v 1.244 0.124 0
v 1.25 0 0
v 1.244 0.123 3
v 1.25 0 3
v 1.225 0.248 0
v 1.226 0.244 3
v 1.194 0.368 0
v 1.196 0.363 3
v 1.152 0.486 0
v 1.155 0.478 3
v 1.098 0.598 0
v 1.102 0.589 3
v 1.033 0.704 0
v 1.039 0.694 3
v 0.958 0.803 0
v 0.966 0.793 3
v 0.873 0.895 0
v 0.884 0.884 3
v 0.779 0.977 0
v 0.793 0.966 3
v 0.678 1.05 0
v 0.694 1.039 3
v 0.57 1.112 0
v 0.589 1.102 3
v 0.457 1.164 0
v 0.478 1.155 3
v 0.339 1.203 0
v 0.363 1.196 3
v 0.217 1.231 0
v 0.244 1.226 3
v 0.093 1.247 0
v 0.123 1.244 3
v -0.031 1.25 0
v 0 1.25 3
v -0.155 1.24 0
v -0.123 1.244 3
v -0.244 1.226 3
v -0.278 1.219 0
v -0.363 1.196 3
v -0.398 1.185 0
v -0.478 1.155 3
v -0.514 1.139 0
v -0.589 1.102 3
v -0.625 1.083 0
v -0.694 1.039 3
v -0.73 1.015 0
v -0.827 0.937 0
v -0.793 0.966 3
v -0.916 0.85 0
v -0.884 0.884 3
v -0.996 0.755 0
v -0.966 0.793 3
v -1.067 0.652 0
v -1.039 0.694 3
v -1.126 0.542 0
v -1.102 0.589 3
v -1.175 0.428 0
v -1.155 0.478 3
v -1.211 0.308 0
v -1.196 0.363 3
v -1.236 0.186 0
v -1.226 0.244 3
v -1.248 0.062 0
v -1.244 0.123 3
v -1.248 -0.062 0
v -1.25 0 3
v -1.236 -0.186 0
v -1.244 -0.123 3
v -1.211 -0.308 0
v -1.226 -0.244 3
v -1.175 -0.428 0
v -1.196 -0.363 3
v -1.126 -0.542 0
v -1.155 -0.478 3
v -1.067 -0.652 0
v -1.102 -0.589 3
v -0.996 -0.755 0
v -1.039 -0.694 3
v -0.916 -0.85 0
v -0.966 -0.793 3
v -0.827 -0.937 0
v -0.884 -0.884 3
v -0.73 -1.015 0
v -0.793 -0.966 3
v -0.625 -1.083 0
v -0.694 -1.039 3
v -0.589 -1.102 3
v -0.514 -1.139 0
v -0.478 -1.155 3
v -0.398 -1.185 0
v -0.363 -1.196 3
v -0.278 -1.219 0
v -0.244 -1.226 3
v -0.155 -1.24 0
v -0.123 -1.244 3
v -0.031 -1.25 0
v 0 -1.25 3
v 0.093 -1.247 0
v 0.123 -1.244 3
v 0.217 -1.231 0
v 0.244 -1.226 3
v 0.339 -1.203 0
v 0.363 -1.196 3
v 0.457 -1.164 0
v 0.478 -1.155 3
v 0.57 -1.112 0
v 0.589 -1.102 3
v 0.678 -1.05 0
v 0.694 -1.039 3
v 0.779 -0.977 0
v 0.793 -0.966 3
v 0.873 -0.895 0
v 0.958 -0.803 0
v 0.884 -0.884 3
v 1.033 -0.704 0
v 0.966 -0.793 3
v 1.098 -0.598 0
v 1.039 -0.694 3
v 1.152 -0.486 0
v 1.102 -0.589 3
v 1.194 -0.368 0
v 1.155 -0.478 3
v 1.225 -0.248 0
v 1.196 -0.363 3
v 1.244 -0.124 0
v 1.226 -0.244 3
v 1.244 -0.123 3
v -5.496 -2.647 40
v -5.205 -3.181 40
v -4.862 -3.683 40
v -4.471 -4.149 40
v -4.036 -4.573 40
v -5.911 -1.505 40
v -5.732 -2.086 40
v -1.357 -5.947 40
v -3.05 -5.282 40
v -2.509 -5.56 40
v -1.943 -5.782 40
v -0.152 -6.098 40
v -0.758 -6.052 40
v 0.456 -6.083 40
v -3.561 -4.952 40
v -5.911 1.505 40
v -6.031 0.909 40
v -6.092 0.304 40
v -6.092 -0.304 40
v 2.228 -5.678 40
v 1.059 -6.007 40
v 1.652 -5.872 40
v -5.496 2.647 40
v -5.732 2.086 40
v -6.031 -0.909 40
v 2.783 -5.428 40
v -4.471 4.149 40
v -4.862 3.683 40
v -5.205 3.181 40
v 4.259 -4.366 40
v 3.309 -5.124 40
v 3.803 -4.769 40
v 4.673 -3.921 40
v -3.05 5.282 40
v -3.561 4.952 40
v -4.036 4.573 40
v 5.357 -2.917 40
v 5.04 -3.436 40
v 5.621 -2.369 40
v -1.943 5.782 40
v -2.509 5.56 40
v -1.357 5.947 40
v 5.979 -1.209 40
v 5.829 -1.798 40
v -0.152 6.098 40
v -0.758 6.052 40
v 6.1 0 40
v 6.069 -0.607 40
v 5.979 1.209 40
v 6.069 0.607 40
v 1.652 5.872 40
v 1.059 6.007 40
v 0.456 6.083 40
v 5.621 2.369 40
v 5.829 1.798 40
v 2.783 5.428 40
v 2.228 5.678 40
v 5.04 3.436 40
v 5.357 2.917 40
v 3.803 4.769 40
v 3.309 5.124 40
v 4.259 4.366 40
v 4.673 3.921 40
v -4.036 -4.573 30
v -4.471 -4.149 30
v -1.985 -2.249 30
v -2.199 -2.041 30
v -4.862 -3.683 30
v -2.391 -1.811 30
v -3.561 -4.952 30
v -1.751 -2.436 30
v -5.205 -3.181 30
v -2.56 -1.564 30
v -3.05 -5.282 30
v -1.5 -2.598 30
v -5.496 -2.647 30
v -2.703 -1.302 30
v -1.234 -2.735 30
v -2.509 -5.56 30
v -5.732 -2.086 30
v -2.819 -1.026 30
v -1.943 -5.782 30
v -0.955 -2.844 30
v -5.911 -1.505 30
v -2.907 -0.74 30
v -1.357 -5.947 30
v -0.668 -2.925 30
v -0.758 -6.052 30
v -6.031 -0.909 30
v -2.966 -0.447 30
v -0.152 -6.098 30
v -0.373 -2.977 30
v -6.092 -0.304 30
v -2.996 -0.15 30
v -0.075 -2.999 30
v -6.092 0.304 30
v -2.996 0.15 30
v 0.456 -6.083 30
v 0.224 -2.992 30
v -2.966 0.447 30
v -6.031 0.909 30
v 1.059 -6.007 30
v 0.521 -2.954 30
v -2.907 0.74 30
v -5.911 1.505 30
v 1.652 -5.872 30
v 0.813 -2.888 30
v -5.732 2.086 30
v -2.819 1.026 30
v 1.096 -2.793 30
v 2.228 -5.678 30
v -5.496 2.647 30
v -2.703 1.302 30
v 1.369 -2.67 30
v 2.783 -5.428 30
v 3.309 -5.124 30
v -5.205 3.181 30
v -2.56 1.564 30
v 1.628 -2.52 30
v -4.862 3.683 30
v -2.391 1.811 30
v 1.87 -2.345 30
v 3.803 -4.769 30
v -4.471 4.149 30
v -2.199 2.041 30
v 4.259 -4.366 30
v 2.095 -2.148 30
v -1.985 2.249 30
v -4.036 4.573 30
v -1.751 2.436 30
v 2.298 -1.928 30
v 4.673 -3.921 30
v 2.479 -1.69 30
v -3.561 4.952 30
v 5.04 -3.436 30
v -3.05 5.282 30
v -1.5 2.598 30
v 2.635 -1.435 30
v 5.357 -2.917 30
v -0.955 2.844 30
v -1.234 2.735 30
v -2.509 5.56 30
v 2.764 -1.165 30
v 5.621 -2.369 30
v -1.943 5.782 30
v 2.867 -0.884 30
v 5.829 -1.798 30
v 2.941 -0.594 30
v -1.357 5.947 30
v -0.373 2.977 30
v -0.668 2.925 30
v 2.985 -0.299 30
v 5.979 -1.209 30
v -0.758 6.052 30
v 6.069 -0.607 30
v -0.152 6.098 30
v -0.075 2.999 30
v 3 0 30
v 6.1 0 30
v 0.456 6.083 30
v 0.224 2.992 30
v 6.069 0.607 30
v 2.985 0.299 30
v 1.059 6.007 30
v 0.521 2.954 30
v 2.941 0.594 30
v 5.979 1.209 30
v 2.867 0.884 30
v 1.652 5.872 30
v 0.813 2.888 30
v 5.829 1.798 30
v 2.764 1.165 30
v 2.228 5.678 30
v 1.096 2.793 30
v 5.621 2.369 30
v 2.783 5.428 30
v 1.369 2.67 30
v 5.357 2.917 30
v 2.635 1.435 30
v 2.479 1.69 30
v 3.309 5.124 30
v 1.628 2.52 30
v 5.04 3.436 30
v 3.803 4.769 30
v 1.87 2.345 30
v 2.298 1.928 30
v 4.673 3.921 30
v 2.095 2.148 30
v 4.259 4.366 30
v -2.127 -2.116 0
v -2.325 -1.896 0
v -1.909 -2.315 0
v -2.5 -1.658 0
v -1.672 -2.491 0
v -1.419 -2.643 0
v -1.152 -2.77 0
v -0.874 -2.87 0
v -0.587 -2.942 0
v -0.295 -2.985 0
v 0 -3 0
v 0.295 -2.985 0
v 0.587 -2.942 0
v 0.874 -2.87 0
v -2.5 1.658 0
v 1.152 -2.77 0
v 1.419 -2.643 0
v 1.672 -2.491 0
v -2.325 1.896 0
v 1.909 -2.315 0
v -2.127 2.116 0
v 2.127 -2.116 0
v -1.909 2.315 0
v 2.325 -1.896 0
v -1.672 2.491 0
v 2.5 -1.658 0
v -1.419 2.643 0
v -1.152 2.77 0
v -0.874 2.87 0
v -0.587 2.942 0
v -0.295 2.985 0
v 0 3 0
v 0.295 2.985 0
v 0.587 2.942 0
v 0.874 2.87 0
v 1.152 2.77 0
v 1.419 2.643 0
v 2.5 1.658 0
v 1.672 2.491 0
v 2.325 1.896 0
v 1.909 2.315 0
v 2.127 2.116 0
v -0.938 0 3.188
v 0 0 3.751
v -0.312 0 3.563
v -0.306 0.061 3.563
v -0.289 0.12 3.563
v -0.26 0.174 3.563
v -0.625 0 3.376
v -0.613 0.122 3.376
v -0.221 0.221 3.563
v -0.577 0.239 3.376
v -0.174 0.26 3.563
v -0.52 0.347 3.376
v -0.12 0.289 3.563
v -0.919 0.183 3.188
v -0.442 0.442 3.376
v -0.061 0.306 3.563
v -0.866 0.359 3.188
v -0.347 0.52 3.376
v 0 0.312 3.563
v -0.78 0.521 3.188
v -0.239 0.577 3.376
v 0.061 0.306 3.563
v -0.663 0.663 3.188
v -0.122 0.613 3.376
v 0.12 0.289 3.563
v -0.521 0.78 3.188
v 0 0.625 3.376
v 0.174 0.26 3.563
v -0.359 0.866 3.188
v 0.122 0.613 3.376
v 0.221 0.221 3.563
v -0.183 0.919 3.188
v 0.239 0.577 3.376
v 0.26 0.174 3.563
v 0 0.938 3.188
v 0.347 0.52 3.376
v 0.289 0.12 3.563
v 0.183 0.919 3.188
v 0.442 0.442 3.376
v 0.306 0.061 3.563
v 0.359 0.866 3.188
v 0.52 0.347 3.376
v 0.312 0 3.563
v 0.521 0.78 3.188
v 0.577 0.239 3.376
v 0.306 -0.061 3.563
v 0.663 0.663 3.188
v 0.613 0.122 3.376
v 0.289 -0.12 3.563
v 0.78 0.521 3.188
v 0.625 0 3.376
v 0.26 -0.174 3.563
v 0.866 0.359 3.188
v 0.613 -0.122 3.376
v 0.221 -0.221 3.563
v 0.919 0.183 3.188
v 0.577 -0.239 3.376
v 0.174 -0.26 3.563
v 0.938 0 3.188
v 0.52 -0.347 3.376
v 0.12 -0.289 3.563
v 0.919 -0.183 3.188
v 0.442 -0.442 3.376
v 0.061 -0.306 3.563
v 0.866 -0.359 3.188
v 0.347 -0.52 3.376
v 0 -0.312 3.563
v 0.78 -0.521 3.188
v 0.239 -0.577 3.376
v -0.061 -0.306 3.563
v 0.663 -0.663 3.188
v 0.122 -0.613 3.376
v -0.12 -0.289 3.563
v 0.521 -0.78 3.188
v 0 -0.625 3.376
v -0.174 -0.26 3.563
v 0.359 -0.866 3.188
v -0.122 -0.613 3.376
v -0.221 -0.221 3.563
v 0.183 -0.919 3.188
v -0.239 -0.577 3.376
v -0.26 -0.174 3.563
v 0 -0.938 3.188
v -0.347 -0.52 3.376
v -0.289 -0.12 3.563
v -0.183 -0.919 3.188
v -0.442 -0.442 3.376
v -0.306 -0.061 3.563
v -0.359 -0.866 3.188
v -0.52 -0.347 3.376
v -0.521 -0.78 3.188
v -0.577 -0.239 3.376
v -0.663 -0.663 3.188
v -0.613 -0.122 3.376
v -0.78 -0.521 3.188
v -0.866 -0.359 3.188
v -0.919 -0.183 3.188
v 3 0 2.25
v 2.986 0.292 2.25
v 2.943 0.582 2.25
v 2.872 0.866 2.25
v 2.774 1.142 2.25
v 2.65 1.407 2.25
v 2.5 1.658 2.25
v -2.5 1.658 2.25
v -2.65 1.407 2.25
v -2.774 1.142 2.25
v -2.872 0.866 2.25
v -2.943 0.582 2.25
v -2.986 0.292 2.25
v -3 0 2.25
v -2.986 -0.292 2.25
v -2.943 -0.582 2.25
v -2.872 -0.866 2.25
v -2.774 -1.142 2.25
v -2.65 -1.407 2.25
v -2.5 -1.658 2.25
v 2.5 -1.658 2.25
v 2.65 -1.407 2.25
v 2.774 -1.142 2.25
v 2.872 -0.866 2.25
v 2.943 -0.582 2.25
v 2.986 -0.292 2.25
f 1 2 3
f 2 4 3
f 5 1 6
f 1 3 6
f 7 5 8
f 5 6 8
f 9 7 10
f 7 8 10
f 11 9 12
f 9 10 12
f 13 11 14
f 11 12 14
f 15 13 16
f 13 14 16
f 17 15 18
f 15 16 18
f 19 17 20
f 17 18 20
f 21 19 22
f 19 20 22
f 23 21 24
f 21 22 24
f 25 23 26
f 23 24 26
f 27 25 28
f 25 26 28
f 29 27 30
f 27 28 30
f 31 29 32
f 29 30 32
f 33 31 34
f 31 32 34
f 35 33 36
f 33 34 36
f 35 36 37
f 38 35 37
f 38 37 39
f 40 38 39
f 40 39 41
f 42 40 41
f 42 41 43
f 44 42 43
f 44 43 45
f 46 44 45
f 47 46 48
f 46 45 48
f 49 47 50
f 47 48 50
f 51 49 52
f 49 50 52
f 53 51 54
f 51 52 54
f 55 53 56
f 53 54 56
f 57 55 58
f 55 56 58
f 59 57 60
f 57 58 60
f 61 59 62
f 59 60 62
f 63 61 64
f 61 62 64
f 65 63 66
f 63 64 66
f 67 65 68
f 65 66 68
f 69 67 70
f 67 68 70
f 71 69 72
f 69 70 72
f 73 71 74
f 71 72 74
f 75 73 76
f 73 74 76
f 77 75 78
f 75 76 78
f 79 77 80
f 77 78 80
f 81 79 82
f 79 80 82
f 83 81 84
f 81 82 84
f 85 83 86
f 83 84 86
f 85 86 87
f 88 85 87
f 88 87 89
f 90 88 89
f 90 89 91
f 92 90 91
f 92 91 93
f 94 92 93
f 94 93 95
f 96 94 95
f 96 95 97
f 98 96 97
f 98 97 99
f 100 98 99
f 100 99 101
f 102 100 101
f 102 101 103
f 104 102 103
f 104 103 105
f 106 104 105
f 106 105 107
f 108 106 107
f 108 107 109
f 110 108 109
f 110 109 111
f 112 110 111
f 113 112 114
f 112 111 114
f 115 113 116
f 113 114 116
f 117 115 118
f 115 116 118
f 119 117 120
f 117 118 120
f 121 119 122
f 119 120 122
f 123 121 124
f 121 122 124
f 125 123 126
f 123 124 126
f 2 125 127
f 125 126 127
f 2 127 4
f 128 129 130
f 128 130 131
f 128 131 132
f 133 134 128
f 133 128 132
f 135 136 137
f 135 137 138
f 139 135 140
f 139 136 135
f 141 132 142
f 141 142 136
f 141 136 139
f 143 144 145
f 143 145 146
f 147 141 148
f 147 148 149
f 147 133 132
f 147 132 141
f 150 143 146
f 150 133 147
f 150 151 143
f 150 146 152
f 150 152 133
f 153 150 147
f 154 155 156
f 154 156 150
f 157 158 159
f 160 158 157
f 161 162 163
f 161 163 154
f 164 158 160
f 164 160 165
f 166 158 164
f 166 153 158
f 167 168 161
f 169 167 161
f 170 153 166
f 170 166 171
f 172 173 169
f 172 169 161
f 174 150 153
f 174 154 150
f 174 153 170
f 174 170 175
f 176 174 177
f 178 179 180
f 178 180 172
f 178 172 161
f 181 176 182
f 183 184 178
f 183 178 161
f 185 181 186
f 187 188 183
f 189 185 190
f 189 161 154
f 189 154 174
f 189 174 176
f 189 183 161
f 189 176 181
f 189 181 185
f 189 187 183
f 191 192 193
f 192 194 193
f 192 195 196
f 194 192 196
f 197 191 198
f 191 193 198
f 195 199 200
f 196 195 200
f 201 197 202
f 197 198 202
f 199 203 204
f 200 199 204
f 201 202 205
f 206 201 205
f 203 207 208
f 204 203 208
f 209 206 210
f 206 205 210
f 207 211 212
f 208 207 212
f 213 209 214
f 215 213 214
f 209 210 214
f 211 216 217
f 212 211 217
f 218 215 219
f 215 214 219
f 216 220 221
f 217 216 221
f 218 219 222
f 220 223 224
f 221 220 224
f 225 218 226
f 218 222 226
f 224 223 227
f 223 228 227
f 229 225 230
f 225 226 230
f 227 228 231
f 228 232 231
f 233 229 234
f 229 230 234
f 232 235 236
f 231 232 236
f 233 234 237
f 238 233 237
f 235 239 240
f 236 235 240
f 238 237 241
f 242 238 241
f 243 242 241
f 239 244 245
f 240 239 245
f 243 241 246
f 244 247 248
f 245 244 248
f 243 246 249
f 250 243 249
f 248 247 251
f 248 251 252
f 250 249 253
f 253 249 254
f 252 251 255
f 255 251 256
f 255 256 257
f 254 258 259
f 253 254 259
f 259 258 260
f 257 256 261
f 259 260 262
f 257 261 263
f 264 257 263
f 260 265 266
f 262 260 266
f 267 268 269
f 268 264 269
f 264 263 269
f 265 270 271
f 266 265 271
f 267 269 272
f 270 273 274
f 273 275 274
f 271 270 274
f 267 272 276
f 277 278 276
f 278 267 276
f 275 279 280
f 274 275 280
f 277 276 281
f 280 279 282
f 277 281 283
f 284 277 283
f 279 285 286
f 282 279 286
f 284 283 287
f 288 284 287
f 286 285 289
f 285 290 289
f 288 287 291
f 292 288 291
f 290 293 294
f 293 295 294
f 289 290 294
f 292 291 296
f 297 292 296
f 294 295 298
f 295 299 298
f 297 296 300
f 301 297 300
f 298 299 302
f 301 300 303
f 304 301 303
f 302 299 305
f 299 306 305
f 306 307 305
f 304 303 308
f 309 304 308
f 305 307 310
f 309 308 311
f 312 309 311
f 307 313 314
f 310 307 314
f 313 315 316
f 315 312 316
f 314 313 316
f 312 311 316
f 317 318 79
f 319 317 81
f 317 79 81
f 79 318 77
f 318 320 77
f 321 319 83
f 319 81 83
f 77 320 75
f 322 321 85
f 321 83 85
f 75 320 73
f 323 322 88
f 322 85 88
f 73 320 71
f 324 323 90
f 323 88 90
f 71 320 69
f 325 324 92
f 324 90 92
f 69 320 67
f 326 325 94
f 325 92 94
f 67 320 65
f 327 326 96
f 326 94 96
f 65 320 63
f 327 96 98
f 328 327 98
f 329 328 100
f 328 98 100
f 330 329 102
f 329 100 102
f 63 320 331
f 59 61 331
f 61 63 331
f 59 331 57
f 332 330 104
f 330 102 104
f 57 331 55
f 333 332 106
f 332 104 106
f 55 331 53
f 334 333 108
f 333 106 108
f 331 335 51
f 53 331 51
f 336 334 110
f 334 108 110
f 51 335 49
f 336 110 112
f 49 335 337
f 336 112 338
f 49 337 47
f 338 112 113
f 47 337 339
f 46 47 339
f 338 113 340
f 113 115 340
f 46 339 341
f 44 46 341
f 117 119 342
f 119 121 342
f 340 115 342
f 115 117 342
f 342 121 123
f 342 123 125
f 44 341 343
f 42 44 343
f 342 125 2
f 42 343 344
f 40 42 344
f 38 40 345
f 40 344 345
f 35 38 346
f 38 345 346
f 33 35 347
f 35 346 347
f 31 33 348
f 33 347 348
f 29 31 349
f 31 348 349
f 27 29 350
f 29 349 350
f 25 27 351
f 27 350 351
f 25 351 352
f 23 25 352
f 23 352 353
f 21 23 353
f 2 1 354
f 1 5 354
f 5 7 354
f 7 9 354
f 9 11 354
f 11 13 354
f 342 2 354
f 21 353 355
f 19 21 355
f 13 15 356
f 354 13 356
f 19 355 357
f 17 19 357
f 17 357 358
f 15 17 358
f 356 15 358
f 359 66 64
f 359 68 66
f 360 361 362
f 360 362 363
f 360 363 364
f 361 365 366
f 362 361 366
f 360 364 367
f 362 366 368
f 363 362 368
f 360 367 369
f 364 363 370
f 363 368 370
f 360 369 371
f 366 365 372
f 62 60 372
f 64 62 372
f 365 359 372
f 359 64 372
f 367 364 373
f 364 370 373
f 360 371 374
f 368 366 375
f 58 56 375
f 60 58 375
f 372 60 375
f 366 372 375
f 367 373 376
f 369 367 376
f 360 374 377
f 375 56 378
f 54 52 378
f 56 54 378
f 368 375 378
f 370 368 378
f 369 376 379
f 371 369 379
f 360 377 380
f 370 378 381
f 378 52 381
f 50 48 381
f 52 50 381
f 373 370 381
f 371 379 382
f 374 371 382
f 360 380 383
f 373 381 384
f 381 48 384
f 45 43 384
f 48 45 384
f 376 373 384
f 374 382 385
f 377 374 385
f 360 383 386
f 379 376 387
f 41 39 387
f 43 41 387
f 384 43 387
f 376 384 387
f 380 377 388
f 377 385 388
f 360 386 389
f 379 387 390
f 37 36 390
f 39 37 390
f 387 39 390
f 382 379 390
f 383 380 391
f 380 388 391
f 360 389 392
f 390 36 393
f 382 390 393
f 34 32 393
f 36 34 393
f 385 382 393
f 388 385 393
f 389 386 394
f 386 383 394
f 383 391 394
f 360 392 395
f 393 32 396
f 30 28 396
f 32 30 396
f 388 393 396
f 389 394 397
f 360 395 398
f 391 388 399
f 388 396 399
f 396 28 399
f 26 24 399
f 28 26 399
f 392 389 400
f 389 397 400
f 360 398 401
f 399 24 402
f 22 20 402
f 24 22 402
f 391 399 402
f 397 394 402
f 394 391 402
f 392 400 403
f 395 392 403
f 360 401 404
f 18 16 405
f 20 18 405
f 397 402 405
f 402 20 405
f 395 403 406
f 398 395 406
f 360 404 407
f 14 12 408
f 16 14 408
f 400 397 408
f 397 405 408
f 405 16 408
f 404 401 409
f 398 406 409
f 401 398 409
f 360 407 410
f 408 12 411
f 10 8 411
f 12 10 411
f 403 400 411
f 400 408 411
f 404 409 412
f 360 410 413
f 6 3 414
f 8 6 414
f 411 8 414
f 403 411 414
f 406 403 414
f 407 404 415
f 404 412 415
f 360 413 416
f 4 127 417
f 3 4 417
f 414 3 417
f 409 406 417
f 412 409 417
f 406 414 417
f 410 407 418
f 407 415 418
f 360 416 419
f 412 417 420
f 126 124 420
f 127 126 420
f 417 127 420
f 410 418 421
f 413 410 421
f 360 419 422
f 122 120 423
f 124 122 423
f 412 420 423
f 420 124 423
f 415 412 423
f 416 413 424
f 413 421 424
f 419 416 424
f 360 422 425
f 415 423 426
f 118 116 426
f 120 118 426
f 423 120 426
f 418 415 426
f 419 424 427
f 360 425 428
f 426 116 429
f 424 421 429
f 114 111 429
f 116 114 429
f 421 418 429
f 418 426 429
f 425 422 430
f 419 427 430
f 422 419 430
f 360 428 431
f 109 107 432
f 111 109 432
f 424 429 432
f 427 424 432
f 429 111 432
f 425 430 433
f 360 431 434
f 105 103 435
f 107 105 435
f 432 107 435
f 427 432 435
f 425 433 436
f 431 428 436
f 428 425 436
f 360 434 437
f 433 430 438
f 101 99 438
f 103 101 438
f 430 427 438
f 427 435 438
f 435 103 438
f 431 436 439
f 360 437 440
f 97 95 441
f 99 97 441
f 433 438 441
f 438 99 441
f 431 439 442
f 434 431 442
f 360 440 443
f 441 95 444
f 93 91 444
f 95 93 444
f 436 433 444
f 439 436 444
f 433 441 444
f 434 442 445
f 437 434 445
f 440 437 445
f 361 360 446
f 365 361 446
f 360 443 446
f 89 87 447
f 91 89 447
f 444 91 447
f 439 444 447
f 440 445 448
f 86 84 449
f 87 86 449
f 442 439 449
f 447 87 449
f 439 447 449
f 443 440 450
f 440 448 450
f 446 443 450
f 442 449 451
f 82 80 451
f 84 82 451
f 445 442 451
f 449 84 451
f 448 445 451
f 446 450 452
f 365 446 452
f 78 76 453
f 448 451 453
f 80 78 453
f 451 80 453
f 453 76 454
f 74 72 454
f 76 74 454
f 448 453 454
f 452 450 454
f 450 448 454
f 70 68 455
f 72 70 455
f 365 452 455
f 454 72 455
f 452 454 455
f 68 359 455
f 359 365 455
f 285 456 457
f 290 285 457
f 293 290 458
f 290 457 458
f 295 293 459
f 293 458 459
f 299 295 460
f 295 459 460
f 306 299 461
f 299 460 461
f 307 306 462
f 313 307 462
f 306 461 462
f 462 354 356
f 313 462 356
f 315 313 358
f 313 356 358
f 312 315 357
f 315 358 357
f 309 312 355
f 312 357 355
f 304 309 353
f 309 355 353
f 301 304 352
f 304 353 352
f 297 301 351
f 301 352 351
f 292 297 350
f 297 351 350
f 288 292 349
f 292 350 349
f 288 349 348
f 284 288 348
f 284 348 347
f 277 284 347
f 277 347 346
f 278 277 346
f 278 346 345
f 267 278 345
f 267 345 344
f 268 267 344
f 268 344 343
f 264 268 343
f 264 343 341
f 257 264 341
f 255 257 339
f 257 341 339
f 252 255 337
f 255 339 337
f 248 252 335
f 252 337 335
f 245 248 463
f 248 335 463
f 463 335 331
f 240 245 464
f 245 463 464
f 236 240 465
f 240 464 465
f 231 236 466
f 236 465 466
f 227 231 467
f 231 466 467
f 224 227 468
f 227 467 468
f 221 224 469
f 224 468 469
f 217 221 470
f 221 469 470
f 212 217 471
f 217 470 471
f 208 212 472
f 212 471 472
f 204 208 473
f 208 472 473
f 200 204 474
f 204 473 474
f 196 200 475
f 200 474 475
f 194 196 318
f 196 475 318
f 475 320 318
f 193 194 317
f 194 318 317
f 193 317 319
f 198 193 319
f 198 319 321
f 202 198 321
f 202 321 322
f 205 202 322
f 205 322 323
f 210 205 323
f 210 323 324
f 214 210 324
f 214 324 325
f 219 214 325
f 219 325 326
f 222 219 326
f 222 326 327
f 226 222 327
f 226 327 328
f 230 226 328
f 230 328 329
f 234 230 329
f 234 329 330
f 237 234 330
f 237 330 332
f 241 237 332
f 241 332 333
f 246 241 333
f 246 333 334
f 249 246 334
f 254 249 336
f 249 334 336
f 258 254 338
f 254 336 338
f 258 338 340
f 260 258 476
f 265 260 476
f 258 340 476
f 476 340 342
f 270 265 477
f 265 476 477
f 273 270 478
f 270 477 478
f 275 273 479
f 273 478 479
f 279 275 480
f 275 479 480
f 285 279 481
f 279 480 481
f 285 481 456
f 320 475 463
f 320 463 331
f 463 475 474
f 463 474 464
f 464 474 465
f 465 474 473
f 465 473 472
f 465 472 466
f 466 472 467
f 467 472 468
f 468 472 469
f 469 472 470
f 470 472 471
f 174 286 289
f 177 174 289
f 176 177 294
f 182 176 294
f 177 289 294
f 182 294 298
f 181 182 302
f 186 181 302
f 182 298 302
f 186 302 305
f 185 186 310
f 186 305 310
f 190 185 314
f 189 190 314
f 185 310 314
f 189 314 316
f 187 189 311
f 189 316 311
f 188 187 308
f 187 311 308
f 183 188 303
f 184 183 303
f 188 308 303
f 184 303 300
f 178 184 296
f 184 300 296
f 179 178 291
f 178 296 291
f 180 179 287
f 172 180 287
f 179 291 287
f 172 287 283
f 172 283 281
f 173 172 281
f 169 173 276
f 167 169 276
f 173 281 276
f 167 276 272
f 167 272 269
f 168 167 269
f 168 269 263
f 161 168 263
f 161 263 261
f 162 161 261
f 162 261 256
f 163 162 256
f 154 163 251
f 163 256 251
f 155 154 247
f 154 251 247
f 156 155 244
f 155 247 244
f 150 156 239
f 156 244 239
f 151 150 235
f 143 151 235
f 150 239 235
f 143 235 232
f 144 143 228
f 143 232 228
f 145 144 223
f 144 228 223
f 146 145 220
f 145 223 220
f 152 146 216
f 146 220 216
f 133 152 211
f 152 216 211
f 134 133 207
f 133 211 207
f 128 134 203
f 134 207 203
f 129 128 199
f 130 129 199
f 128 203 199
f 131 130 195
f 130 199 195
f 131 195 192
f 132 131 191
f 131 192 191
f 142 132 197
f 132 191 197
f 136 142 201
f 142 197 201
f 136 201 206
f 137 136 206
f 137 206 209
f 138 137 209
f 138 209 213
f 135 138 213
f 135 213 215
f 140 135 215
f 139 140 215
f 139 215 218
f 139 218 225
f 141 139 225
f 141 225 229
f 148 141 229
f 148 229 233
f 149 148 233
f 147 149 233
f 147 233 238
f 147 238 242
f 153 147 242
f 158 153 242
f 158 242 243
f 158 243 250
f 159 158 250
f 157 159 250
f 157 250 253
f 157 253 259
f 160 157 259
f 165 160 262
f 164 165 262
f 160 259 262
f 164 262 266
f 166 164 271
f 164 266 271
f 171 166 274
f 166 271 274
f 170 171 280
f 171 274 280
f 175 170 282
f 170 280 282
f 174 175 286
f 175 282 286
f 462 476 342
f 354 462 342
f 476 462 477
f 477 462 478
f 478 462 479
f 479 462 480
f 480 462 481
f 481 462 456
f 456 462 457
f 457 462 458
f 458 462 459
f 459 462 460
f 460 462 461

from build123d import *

# Parameters (mm, degrees)
SKETCH1_R                       = 3
BOSS_EXTRUDE1_DEPTH             = 30
SKETCH2_R                       = 6.099567635
BOSS_EXTRUDE2_DEPTH             = 10
CUT_EXTRUDE1_DEPTH              = 41.919548515
CUT_EXTRUDE1_DEPTH_BACK         = 41.919548515
SKETCH3_W                       = 2.43383409
SKETCH3_H                       = 2.25
SKETCH3_W_2                     = 2.704181163
TAP_DRILL_FOR_M3X0_5_TAP1_D     = 2.5
TAP_DRILL_FOR_M3X0_5_TAP1_DEPTH = 2.999994
TAP_DRILL_FOR_M3X0_5_TAP1_TIP   = 0.751075774


with BuildPart() as part:
    # Sketch1 → Boss-Extrude1 (new body)
    with BuildSketch(Plane.XY):
        Circle(SKETCH1_R)
    extrude(amount=BOSS_EXTRUDE1_DEPTH)

    # Sketch2 → Boss-Extrude2 (add)
    with BuildSketch(Plane.XY.offset(30)):
        Circle(SKETCH2_R)
    extrude(amount=BOSS_EXTRUDE2_DEPTH)

    # Sketch3 → Cut-Extrude1 (cut, two sides: drawn at the far end of the back side and taken through both)
    with BuildSketch(Plane(origin=(0, 0, 0), x_dir=(1, 0, 0), z_dir=(0, 1, 0)).offset(-CUT_EXTRUDE1_DEPTH_BACK)):
        with Locations((3.716917045, -1.125)):
            Rectangle(SKETCH3_W, SKETCH3_H)
        with Locations((-3.852090582, -1.125)):
            Rectangle(SKETCH3_W_2, SKETCH3_H)
    extrude(amount=CUT_EXTRUDE1_DEPTH + CUT_EXTRUDE1_DEPTH_BACK, mode=Mode.SUBTRACT)

    # Tap Drill for M3x0.5 Tap1
    with Locations(Plane(origin=(0, 0, 0), x_dir=(-1, 0, 0), z_dir=(0, 0, -1))):
        with Locations((0, 0)):
            Hole(TAP_DRILL_FOR_M3X0_5_TAP1_D / 2, depth=TAP_DRILL_FOR_M3X0_5_TAP1_DEPTH)
            with Locations((0, 0, -(TAP_DRILL_FOR_M3X0_5_TAP1_DEPTH + TAP_DRILL_FOR_M3X0_5_TAP1_TIP / 2))):  # 118° drill point
                Cone(0, TAP_DRILL_FOR_M3X0_5_TAP1_D / 2, TAP_DRILL_FOR_M3X0_5_TAP1_TIP, mode=Mode.SUBTRACT)


solid = part.part
